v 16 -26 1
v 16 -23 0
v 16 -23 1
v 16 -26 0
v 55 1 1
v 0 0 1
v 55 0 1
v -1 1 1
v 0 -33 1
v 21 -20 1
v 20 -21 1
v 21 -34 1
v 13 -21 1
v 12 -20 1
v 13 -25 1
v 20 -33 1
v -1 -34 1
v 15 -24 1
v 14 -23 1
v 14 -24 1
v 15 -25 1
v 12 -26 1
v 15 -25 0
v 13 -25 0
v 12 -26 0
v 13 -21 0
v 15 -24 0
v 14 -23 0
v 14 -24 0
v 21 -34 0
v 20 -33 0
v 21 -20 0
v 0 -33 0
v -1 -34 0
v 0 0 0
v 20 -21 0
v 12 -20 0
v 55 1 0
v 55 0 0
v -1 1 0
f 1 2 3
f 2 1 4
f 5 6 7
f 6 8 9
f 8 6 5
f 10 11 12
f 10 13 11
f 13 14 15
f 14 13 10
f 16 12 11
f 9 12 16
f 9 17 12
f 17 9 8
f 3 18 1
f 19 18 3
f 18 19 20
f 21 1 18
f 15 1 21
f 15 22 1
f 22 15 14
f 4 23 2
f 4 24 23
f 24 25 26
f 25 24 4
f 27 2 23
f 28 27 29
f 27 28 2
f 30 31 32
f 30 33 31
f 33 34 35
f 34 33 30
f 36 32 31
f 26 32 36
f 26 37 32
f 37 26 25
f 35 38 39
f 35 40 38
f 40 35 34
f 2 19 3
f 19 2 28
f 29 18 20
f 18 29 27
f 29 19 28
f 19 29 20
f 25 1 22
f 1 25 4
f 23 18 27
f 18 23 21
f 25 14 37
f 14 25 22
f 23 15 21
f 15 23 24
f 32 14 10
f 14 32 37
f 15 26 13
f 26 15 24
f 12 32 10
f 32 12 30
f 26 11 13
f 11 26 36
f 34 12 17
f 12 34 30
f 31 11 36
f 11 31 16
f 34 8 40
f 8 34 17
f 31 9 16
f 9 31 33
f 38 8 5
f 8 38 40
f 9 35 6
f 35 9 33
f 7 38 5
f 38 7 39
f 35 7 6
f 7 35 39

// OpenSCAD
{
cube([55,1,1]);
rotate(90)
translate([-34+1,0,0])
{
cube([34,1,1]);
rotate(90)
translate([-21+1,0,0])
{
cube([21,1,1]);
rotate(90)
translate([-13+1,0,0])
{
cube([13,1,1]);
rotate(90)
translate([-8+1,0,0])
{
cube([8,1,1]);
rotate(90)
translate([-5+1,0,0])
{
cube([5,1,1]);
rotate(90)
translate([-3+1,0,0])
{
cube([3,1,1]);
rotate(90)
translate([-2+1,0,0])
{
cube([2,1,1]);
rotate(90)
translate([-1+1,0,0])
{
cube([1,1,1]);
rotate(90)
translate([-1+1,0,0])
cube([1,1,1]);
}
}
}
}
}
}
}
}
}
